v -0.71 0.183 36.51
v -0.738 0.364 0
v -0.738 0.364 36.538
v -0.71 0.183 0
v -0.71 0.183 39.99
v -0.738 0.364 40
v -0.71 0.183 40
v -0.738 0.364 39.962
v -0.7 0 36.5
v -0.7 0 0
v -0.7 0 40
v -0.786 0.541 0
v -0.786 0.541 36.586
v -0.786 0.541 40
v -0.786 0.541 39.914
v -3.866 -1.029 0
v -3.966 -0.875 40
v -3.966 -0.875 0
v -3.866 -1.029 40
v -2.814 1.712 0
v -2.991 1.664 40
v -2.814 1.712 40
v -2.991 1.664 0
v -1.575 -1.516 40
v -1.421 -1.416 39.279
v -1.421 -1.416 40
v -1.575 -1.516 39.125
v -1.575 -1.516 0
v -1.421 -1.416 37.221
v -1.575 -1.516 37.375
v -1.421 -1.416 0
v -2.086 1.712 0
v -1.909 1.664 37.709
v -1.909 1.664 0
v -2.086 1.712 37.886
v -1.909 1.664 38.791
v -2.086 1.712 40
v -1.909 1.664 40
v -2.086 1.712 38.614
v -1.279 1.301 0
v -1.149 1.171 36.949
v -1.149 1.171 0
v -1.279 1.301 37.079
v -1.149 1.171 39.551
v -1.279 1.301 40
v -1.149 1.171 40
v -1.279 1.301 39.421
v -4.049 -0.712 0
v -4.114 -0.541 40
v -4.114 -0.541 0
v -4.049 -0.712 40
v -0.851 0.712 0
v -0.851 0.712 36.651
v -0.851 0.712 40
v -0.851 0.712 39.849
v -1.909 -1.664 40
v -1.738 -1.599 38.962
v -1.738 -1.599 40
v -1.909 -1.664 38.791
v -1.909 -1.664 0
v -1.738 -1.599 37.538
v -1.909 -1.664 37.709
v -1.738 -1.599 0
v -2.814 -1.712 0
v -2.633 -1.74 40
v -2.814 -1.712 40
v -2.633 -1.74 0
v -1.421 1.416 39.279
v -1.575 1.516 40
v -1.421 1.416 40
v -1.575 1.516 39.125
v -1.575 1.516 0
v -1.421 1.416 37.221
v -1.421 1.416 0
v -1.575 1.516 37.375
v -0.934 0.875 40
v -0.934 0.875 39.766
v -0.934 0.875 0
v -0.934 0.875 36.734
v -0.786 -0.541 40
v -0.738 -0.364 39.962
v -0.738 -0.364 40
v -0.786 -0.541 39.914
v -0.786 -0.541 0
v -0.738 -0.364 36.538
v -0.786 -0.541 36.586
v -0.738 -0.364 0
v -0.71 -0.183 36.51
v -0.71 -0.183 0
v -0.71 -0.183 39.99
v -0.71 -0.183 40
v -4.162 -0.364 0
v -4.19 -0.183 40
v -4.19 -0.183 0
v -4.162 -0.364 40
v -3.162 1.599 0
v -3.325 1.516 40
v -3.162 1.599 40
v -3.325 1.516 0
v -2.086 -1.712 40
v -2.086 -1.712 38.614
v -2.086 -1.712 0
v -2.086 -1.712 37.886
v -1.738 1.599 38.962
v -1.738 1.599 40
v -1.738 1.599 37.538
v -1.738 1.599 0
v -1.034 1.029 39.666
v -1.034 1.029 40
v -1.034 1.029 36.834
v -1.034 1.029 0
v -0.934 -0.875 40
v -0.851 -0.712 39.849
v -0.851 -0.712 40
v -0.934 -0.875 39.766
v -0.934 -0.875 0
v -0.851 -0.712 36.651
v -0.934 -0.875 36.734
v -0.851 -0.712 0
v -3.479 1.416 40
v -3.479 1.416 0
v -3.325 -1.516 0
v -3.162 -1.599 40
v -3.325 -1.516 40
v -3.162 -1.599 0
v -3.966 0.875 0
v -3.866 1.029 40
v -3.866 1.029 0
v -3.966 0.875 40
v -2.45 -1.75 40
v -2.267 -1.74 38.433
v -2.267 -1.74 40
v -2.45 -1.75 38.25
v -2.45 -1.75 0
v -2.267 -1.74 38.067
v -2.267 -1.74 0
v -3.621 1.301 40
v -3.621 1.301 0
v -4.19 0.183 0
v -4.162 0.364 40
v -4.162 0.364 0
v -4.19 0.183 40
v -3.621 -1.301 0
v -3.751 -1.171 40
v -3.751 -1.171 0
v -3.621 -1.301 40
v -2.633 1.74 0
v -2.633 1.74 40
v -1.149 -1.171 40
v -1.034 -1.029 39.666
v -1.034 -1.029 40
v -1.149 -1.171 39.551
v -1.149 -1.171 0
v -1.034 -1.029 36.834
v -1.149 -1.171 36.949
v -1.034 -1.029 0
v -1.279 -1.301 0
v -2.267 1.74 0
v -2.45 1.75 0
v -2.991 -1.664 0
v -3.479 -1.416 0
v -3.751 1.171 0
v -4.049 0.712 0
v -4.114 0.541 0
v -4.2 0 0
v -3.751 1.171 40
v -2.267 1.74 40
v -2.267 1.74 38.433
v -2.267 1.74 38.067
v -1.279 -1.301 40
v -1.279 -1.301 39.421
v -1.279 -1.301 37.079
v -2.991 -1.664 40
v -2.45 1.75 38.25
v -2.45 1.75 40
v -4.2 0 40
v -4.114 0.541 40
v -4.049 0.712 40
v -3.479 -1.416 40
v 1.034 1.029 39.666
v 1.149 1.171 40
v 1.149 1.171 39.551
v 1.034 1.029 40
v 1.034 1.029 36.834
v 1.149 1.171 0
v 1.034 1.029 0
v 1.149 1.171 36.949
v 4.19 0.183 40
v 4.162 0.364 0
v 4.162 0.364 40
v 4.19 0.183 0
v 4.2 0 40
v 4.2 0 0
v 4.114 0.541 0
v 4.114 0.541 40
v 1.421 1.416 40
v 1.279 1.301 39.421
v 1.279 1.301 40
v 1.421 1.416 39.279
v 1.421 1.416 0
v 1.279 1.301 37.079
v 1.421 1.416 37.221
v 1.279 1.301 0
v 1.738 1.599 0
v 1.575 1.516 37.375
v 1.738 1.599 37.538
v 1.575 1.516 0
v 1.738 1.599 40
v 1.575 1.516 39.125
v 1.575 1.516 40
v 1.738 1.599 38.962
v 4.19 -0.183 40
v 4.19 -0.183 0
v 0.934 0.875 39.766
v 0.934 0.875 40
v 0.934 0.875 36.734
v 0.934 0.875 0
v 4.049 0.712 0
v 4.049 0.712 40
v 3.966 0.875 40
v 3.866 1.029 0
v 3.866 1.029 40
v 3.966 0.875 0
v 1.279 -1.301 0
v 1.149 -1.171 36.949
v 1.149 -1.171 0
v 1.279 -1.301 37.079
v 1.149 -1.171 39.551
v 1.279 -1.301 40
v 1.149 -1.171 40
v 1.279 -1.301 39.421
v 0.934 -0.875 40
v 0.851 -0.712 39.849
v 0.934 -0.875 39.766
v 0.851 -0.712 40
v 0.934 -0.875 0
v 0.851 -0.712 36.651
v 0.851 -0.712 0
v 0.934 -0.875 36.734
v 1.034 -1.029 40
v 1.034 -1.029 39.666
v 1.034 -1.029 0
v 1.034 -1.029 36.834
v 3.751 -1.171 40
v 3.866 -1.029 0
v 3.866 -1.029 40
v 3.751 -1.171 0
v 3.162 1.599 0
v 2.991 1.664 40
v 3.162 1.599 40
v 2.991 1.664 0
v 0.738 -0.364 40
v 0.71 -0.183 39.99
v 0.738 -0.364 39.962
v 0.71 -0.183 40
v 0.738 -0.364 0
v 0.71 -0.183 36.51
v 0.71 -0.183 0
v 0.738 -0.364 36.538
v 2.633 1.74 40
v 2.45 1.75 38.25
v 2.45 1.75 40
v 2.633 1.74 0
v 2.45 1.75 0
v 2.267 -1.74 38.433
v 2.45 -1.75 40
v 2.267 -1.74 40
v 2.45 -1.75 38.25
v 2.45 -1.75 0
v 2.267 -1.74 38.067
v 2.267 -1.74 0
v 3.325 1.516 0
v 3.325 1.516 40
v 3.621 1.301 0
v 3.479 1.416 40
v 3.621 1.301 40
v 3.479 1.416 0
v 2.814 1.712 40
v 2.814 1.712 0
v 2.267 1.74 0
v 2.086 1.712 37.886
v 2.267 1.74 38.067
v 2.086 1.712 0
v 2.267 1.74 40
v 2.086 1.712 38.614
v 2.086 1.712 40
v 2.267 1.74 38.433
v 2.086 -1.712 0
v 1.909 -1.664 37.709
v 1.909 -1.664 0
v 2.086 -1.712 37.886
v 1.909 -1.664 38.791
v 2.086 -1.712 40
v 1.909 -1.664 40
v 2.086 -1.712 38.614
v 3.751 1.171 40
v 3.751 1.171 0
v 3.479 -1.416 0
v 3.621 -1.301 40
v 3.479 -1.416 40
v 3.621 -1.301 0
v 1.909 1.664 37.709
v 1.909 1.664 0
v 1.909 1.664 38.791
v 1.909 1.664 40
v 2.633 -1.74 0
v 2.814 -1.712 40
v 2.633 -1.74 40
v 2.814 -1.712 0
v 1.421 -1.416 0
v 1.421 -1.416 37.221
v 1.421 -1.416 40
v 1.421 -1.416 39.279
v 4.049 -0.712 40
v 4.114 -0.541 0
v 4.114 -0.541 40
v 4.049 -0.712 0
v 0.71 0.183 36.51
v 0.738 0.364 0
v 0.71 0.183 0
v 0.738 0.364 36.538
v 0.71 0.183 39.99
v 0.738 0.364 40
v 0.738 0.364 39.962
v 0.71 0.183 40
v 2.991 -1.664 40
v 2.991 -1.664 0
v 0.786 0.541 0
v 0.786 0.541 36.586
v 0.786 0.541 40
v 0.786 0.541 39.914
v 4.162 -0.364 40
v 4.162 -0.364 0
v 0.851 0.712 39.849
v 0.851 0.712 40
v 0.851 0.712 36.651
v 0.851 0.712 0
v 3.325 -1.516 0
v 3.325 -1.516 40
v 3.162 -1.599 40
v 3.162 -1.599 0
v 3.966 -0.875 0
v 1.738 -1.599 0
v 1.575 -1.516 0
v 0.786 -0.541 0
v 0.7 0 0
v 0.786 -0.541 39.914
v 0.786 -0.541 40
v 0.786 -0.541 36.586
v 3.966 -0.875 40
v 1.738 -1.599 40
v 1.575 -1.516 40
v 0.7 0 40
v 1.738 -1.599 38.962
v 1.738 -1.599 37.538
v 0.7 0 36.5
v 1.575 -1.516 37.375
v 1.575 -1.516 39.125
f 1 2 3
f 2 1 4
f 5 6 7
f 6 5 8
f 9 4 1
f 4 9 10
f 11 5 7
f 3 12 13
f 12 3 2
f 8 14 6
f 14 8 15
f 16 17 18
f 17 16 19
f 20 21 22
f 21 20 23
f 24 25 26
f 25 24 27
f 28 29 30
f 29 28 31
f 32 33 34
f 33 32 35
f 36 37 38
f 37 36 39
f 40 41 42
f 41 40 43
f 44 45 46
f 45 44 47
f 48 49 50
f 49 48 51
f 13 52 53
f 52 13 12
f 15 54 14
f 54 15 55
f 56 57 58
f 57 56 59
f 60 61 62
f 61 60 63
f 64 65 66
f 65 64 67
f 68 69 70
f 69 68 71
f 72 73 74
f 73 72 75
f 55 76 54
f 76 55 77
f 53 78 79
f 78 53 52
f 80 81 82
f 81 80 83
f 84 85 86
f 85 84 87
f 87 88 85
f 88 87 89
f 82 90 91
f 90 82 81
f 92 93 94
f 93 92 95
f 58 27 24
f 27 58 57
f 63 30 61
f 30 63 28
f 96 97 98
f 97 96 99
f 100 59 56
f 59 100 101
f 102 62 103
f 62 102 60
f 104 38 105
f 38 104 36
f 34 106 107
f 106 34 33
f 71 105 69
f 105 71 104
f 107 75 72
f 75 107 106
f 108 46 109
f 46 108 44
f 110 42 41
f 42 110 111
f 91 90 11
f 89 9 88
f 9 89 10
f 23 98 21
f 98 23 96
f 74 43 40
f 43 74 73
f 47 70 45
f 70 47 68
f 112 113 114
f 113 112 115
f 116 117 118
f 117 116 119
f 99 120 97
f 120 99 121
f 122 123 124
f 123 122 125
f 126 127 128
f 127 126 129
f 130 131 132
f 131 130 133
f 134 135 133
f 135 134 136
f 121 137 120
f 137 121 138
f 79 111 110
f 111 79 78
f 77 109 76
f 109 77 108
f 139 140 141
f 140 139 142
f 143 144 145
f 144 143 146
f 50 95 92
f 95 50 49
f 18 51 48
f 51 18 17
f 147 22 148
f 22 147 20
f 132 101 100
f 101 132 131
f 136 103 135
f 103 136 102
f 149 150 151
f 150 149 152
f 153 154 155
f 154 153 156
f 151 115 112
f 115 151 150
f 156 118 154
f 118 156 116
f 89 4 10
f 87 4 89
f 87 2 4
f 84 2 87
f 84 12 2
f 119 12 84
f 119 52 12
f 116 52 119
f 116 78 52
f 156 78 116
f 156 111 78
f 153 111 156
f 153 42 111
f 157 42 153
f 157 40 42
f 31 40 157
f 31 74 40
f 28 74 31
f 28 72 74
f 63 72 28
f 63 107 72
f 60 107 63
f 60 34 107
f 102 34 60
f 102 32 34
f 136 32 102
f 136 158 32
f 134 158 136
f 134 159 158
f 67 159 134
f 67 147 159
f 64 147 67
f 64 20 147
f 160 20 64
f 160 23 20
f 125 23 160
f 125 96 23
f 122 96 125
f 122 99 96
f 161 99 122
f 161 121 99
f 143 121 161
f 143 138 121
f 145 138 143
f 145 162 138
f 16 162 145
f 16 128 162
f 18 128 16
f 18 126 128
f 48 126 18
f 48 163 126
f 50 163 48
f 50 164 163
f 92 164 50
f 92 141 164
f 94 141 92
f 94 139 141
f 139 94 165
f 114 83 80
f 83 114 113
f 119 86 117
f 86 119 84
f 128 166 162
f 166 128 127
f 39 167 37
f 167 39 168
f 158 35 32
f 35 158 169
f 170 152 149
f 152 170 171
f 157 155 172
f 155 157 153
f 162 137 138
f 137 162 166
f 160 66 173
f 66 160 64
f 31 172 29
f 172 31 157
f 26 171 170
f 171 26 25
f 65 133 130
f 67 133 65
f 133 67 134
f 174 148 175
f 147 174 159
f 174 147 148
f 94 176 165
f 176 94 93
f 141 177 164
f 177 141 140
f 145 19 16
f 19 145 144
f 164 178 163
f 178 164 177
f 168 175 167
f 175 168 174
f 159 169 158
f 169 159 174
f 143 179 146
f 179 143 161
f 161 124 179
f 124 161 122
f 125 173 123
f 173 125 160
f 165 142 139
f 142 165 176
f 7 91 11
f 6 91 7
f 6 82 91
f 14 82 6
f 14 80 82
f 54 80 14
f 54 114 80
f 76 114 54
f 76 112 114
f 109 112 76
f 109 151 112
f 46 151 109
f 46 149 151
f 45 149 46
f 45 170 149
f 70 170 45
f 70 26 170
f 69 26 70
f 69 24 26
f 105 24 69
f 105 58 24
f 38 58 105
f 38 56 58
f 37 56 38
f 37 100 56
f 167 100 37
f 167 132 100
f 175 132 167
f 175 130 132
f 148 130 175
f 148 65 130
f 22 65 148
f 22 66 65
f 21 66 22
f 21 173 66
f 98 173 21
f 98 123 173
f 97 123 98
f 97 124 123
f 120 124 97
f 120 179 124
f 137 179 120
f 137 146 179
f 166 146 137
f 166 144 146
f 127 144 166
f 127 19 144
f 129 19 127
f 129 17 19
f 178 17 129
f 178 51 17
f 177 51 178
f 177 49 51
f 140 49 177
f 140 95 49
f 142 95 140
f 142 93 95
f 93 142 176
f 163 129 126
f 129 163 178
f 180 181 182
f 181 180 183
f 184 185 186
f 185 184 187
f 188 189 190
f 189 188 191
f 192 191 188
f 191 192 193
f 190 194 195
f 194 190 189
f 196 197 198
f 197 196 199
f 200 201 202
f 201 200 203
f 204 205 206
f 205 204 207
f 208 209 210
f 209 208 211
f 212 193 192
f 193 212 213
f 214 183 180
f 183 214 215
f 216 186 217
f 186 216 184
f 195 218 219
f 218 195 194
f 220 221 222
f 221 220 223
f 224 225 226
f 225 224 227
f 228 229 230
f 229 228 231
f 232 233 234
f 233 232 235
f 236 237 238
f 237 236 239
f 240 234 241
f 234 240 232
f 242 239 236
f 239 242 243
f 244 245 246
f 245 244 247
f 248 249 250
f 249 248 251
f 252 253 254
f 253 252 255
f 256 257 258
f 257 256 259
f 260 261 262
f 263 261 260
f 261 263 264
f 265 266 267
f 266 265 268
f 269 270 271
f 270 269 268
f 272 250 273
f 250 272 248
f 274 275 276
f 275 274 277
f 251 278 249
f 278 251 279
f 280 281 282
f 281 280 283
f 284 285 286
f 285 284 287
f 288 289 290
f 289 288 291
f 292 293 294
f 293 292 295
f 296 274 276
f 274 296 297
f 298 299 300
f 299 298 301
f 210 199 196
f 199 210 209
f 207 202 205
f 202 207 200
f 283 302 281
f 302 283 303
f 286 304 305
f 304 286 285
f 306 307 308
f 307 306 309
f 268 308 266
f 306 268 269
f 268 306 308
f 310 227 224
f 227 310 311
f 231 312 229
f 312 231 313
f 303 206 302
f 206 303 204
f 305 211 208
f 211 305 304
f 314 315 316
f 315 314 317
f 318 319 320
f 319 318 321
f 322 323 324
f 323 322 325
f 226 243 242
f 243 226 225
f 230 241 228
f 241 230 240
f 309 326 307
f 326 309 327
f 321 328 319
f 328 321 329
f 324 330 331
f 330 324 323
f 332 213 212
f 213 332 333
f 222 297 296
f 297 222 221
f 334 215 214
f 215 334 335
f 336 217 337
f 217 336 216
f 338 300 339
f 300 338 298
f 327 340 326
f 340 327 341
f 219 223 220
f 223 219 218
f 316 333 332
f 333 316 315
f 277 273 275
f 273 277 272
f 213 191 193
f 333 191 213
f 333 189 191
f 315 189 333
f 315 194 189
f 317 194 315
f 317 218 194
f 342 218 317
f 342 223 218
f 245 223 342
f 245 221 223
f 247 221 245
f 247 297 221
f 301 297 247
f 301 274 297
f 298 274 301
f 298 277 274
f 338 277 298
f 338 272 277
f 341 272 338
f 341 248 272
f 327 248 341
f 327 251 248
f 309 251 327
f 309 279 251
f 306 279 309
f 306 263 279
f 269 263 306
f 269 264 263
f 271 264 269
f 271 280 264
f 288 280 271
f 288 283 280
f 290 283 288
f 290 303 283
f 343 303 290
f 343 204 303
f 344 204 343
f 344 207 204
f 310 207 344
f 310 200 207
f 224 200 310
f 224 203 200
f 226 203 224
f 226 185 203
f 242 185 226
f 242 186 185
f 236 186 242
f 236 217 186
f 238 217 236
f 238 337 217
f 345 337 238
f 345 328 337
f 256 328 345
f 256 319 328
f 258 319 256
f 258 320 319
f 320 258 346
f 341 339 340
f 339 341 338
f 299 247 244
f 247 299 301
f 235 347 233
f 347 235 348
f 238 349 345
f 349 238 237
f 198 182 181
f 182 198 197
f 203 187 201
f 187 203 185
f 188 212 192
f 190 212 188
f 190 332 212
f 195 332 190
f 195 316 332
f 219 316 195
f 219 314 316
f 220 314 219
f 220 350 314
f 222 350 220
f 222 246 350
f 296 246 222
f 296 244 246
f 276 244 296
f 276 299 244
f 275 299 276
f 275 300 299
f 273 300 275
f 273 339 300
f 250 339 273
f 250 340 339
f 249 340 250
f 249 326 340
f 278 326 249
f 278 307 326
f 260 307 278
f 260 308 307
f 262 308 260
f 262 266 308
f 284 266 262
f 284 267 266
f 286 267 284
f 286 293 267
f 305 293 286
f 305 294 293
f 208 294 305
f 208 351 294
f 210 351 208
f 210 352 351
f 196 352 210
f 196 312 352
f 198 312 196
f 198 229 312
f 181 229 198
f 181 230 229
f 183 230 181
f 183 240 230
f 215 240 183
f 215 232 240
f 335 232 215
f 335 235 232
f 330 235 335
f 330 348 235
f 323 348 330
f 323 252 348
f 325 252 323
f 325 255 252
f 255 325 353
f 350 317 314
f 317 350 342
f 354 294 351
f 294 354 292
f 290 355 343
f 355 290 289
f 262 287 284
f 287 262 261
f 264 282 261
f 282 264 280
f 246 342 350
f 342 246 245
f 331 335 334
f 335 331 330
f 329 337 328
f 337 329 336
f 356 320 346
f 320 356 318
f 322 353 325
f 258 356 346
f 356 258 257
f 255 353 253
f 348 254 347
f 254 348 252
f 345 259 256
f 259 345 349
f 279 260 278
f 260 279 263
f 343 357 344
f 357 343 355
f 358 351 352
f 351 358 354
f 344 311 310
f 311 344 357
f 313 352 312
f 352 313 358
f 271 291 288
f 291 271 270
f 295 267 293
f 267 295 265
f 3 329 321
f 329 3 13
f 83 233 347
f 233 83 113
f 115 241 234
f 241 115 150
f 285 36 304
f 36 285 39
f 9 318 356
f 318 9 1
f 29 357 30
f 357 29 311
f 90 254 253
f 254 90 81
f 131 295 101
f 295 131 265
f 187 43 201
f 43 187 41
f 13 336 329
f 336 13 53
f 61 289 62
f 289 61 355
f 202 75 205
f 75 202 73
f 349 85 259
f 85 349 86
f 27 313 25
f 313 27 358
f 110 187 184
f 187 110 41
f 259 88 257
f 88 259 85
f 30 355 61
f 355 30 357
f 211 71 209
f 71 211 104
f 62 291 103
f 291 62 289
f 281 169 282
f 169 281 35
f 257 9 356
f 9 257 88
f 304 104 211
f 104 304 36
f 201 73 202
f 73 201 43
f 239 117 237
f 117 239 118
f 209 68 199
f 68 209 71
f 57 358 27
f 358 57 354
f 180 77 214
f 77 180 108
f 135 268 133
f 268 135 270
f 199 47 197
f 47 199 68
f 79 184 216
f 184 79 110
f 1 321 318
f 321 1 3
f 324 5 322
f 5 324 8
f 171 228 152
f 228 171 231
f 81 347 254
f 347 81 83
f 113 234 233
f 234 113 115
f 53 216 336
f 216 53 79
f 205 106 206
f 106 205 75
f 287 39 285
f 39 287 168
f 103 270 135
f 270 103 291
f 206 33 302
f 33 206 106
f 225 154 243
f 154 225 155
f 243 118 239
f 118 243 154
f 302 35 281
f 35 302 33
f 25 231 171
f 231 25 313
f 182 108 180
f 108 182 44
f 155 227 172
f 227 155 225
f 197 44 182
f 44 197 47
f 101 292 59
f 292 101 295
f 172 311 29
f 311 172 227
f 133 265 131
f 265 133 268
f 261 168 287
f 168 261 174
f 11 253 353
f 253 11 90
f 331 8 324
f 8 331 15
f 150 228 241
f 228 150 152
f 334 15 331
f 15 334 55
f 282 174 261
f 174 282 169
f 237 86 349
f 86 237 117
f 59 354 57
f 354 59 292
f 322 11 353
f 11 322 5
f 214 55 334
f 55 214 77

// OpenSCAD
// Two-prong cotter pin.
$fn = 60;
eps = 0.02;
wire_d = 3.5;
length = 40;
prong_gap = wire_d*1.4;
union() {
    translate([-prong_gap/2,0,0]) cylinder(d=wire_d,h=length);
    translate([prong_gap/2,0,0]) cylinder(d=wire_d,h=length);
    translate([-prong_gap/2,0,length-wire_d/2]) rotate([0,90,0]) cylinder(d=wire_d,h=prong_gap);
}
